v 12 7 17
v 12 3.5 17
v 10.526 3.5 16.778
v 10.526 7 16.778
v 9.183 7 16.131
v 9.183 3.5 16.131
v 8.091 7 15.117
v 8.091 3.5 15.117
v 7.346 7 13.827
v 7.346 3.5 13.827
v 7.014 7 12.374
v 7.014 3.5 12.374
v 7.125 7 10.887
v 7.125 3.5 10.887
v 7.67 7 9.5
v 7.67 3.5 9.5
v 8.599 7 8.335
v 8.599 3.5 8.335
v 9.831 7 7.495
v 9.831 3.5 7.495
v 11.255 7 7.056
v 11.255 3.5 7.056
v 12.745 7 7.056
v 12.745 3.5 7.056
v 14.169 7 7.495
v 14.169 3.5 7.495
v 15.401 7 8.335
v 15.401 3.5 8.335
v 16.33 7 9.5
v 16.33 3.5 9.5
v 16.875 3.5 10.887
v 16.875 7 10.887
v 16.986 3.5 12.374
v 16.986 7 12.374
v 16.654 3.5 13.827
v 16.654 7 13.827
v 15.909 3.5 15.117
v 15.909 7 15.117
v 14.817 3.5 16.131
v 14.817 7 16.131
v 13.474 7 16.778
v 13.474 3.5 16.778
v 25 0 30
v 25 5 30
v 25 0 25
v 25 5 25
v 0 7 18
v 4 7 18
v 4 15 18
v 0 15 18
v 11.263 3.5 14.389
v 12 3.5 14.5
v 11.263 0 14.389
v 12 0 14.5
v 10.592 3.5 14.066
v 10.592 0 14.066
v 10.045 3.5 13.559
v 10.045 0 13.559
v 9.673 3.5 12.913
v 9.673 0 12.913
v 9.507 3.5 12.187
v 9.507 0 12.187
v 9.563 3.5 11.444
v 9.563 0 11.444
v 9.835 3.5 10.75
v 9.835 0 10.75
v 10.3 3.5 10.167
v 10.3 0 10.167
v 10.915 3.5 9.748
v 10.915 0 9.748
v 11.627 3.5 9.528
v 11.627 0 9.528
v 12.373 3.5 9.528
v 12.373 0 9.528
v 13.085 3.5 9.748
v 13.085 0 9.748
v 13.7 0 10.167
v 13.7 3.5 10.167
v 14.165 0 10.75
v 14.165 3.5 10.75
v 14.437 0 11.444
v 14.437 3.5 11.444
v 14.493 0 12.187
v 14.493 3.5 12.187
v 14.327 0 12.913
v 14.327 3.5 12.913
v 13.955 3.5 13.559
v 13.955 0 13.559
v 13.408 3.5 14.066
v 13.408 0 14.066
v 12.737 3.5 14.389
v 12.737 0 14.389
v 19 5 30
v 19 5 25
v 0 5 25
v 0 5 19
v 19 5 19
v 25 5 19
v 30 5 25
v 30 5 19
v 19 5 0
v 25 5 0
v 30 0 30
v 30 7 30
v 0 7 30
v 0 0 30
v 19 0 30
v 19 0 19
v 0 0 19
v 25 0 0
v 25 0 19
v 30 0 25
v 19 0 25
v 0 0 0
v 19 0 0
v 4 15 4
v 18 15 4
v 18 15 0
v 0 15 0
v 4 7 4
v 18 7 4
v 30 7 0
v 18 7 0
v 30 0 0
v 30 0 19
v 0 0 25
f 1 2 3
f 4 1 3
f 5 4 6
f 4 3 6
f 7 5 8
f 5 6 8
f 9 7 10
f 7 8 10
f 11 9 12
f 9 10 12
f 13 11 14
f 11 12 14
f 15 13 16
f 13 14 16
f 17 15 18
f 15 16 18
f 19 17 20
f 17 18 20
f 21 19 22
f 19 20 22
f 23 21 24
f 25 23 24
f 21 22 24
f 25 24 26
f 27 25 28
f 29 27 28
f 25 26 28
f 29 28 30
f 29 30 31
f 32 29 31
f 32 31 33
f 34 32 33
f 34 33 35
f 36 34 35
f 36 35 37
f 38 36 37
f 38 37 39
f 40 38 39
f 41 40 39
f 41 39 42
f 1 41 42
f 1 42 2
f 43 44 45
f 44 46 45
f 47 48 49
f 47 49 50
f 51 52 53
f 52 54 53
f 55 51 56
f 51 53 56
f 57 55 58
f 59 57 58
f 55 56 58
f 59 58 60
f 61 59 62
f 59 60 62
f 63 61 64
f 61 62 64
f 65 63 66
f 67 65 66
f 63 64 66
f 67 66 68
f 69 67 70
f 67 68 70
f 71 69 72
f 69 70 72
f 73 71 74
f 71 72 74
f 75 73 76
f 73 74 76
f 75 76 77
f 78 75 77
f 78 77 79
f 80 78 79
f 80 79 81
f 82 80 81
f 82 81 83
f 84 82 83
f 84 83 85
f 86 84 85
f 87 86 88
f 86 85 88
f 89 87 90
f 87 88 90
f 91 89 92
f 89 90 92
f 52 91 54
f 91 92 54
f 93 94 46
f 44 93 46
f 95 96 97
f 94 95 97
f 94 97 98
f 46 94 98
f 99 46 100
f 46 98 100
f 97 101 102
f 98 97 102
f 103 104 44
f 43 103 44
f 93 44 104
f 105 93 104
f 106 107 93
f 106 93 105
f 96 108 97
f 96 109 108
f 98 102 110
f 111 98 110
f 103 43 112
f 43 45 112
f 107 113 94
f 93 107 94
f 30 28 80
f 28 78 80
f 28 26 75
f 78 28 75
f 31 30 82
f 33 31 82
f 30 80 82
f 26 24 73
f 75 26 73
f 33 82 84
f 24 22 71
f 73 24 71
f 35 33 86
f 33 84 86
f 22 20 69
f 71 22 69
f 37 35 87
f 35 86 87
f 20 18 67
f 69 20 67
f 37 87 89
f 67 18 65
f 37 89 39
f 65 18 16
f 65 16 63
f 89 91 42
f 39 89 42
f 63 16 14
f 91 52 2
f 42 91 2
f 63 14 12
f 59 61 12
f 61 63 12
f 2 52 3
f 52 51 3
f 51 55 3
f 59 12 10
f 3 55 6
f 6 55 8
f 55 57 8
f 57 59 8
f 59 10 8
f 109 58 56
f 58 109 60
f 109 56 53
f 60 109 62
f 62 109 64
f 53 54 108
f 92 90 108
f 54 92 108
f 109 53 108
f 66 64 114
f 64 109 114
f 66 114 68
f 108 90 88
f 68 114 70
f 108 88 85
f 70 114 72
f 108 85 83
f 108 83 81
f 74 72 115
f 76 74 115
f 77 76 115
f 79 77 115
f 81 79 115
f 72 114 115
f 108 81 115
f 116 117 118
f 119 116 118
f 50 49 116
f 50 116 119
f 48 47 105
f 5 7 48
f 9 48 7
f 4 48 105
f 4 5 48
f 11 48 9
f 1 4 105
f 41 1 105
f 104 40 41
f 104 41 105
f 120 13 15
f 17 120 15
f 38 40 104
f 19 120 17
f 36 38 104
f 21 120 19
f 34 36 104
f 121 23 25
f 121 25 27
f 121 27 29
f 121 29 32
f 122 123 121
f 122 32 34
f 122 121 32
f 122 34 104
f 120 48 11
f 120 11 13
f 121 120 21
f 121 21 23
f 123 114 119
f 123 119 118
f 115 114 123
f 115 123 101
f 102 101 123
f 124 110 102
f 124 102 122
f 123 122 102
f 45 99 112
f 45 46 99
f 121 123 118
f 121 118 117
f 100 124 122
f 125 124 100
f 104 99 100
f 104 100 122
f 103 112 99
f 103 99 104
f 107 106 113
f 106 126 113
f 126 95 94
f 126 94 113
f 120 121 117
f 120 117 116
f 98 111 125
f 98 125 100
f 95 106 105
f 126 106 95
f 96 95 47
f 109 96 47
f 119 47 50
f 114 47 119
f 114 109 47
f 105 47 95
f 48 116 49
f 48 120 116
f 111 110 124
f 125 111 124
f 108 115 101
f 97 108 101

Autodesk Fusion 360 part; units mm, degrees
sketch "Sketch1" plane through (0, 0, 0) normal (0, 1, 0) x (1, 0, 0)
  line L0 (0, 0) -> (30, 0)
  line L1 (30, 0) -> (30, -30)
  line L2 (30, -30) -> (0, -30)
  line L3 (0, -30) -> (0, 0)
  dimension "d1" = 30
  dimension "d2" = 30
extrude "Extrude1" add sketch "Sketch1" along normal blind 7
sketch "Sketch2" plane through (0, 7, 0) normal (0, 1, 0) x (-1, 0, 0)
  line L0 (0, 30) -> (-30, 30)
  line L1 (-30, 30) -> (-30, 0)
  line L2 (-18, 0) -> (-18, 4)
  line L3 (-18, 4) -> (-4, 4)
  line L4 (-4, 4) -> (-4, 18)
  line L5 (-4, 18) -> (0, 18)
  line L6 (0, 18) -> (0, 0)
  line L7 (0, 0) -> (-18, 0)
  dimension "d9" = 18
  dimension "d10" = 18
  dimension "d11" = 4
  dimension "d12" = 4
extrude "Extrude2" add sketch "Sketch2" along normal blind 8
sketch "Sketch3" plane through (0, 0, 0) normal (0, 0, -1) x (-1, 0, 0)
  line L0 (-30, 0) -> (0, 0)
  line L1 (0, 0) -> (0, 15)
  line L2 (0, 15) -> (-18, 15)
  line L3 (-18, 15) -> (-18, 7)
  line L4 (-18, 7) -> (-30, 7)
  line L5 (-30, 7) -> (-30, 0)
  line L6 (-25, 0) -> (-19, 0)
  line L7 (-19, 0) -> (-19, 5)
  line L8 (-19, 5) -> (-25, 5)
  line L9 (-25, 5) -> (-25, 0)
  dimension "d13" = 6
  dimension "d14" = 5
  dimension "d15" = 5
extrude "Extrude3" cut sketch "Sketch3" against normal through all contours L0 L6 L7 L8 L9
sketch "Sketch4" plane through (0, 7, 0) normal (0, 1, 0) x (-1, 0, 0)
  line L0 (-4, 18) -> (0, 18)
  line L1 (0, 18) -> (0, 30)
  line L2 (0, 30) -> (-30, 30)
  line L3 (-30, 30) -> (-30, 0)
  line L4 (-30, 0) -> (-18, 0)
  line L5 (-18, 0) -> (-18, 4)
  line L6 (-18, 4) -> (-4, 4)
  line L7 (-4, 4) -> (-4, 18)
  line L8 (-19, 0) -> (-19, 30)
  point P0 (-12, 12)
  dimension "d18" = 8
  dimension "d28" = 8
hole "Hole1" at (12, 7, 12) direction (0, -1, 0) diameter 5 end through all counterbore diameter 10 counterbore depth 3.5
sketch "Sketch5" plane through (0, 0, 0) normal (-1, 0, 0) x (0, 0, 1)
  line L0 (0, 0) -> (30, 0)
  line L1 (30, 0) -> (30, 7)
  line L2 (30, 7) -> (18, 7)
  line L3 (18, 7) -> (18, 15)
  line L4 (18, 15) -> (0, 15)
  line L5 (0, 15) -> (0, 0)
  line L6 (25, 0) -> (19, 0)
  line L7 (19, 0) -> (19, 5)
  line L8 (19, 5) -> (25, 5)
  line L9 (25, 5) -> (25, 0)
  dimension "d24" = 6
  dimension "d25" = 5
  dimension "d26" = 5
extrude "Extrude4" cut sketch "Sketch5" against normal through all contours L0 L6 L7 L8 L9
equation "d9 = d10"
